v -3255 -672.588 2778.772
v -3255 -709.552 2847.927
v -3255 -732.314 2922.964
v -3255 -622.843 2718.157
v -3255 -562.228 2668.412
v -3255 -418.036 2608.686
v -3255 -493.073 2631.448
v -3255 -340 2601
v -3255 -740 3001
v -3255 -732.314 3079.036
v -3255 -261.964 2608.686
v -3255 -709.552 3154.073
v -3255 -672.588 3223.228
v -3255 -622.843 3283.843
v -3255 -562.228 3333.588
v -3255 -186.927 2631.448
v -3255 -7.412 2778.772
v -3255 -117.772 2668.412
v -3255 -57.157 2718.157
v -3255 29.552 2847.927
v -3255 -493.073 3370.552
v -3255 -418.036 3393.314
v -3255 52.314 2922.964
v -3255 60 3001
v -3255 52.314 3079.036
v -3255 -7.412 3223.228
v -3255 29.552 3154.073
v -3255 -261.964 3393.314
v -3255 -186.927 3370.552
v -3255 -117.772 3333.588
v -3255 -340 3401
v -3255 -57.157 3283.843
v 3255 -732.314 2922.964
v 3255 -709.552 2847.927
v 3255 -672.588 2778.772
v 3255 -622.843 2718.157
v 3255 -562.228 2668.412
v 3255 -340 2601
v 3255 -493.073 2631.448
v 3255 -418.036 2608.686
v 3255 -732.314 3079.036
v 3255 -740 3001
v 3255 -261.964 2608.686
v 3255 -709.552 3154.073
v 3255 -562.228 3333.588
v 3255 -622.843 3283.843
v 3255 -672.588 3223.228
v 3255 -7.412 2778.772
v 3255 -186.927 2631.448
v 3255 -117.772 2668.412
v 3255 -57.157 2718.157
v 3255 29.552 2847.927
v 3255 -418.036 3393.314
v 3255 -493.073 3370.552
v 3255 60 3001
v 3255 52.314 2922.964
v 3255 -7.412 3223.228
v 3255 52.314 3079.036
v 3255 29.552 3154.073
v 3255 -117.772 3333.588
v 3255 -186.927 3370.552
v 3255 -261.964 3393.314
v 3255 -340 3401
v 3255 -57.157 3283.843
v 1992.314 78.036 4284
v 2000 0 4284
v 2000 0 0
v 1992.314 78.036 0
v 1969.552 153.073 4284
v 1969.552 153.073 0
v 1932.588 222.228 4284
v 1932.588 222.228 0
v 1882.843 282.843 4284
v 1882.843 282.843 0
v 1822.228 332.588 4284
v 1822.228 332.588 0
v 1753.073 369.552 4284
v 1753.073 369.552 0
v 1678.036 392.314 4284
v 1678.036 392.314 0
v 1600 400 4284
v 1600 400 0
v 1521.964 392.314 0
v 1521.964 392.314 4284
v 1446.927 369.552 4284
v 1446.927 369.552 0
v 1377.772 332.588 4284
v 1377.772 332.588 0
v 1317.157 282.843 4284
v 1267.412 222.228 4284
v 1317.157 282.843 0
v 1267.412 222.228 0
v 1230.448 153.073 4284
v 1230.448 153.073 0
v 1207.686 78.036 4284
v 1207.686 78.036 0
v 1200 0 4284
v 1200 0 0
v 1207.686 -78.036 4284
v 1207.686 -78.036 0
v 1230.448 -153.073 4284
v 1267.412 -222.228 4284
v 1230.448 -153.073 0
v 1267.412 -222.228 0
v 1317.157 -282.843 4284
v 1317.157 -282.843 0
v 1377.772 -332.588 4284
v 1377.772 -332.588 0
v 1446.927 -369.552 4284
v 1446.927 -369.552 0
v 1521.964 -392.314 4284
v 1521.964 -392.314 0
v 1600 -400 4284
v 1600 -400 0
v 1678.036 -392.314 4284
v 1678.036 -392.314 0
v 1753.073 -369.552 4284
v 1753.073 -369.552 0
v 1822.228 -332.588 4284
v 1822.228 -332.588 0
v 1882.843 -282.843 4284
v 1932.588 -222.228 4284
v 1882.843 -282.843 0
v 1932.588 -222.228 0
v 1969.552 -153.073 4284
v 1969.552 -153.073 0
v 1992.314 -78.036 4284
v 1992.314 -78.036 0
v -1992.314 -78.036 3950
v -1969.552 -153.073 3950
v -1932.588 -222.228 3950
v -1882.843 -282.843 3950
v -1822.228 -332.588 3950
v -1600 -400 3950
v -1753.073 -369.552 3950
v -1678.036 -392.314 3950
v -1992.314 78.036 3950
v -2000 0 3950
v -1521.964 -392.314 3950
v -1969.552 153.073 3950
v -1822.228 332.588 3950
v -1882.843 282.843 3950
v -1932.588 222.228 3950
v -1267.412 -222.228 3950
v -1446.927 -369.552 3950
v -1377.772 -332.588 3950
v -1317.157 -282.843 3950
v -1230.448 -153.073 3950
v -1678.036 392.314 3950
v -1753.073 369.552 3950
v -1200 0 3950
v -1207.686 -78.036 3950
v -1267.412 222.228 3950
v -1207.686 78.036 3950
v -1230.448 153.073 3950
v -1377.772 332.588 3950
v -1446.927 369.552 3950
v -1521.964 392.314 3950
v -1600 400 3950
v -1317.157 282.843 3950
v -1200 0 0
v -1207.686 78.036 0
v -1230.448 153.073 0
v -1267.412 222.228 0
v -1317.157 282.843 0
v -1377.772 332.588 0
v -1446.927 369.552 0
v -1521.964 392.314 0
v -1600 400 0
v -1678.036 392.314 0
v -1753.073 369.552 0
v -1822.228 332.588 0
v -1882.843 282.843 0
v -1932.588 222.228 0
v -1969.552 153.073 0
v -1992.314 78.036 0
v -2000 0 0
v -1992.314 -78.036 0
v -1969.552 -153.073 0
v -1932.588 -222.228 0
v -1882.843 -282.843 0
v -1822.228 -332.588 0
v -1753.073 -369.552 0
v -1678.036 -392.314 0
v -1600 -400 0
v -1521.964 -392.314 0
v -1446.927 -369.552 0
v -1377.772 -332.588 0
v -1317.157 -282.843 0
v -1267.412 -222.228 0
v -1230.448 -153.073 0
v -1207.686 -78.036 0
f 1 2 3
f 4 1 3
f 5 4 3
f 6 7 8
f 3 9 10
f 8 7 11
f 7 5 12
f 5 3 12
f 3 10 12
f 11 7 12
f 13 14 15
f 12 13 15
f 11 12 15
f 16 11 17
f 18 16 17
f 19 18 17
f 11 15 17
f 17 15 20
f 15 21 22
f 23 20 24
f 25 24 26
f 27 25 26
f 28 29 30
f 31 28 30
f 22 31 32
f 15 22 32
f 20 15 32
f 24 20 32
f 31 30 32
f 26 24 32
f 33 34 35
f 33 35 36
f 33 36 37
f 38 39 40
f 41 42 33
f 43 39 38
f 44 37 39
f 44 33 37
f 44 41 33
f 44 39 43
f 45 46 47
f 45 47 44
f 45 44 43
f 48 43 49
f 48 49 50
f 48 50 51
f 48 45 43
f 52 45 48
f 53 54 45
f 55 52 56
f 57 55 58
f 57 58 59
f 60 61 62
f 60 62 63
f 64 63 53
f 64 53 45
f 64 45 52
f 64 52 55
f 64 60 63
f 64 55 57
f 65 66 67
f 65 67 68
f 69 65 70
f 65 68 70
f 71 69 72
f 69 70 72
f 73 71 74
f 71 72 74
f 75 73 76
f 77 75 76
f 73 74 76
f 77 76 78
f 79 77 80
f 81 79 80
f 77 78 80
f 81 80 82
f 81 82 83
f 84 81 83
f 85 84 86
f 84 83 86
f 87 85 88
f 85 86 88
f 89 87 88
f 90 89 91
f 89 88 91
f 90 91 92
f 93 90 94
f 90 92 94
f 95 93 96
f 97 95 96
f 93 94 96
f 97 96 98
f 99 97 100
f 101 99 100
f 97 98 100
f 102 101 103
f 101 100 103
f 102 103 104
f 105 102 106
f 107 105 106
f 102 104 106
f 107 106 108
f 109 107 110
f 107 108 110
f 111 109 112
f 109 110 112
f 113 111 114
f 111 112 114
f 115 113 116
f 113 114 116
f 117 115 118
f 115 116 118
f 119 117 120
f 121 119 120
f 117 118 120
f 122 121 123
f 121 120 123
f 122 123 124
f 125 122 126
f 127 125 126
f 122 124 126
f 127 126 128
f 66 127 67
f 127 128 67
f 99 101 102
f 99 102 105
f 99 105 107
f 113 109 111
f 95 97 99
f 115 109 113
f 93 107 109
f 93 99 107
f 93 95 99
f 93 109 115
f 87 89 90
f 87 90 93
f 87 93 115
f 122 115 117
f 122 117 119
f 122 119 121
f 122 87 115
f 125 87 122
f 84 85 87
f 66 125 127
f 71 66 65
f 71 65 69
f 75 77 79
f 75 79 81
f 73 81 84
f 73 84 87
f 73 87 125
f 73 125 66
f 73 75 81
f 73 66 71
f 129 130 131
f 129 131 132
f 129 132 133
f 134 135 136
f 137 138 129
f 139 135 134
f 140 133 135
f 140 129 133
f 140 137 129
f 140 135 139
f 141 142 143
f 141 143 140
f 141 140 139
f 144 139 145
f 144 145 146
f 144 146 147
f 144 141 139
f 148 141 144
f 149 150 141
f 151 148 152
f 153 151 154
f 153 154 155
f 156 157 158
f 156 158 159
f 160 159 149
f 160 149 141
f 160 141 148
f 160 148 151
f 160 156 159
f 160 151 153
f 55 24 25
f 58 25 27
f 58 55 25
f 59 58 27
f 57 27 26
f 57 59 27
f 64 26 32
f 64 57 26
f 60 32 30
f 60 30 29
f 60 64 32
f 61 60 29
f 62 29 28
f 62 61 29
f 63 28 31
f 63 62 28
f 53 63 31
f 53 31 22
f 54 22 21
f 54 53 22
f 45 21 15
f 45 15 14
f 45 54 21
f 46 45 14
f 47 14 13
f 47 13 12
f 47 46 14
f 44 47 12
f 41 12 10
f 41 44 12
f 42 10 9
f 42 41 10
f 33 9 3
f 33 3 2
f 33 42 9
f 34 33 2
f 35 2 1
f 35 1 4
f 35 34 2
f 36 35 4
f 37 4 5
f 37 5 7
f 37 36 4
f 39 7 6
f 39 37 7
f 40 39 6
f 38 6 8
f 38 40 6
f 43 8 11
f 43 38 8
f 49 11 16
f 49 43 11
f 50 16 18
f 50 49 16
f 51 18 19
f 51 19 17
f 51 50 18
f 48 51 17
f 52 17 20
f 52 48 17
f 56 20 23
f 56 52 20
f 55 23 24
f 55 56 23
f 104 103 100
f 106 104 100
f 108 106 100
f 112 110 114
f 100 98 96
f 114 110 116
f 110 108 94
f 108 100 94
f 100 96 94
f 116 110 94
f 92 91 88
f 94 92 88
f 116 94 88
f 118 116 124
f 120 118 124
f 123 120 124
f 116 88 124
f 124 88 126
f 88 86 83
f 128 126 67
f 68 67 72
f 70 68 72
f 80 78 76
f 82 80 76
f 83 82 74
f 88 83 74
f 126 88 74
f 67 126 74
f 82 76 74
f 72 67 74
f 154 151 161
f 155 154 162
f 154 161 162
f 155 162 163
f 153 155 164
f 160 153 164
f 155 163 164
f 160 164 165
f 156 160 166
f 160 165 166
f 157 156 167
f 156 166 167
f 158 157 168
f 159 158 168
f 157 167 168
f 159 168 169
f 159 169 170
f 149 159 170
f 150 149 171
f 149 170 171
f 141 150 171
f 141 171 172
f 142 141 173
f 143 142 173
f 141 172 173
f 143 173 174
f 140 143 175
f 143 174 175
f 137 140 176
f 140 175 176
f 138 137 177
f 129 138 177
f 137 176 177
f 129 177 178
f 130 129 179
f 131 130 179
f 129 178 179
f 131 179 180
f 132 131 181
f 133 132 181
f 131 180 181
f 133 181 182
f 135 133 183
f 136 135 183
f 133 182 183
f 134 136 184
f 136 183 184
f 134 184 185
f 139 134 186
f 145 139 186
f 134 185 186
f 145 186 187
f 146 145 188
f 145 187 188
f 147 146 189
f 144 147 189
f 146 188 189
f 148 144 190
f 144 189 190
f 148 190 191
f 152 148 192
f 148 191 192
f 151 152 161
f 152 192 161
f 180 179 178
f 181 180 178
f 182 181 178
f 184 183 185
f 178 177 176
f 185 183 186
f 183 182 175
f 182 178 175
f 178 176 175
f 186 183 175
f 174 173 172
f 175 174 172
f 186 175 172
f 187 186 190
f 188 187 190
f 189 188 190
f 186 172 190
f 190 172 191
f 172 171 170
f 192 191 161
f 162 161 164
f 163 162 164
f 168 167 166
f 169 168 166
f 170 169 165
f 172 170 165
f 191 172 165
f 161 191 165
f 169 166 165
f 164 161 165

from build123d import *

# Parameters (mm, degrees)
F0_R     = 400
F1_DEPTH = 3255
F2_R     = 400
F3_DEPTH = 3950
F4_R     = 400
F5_DEPTH = 4284


with BuildPart() as f1:
    # F0 (on Right) → F1 (new body, symmetric)
    with BuildSketch(Plane.YZ):
        with Locations((-340, 3001)):
            Circle(F0_R)
    extrude(amount=F1_DEPTH, both=True)


with BuildPart() as f3:
    # F2 (on Top) → F3 (new body)
    with BuildSketch(Plane.XY):
        with Locations((-1600, 0)):
            Circle(F2_R)
    extrude(amount=F3_DEPTH)


with BuildPart() as f5:
    # F4 (on Top) → F5 (new body)
    with BuildSketch(Plane.XY):
        with Locations((1600, 0)):
            Circle(F4_R)
    extrude(amount=F5_DEPTH)


solid = Compound([f1.part, f3.part, f5.part])
